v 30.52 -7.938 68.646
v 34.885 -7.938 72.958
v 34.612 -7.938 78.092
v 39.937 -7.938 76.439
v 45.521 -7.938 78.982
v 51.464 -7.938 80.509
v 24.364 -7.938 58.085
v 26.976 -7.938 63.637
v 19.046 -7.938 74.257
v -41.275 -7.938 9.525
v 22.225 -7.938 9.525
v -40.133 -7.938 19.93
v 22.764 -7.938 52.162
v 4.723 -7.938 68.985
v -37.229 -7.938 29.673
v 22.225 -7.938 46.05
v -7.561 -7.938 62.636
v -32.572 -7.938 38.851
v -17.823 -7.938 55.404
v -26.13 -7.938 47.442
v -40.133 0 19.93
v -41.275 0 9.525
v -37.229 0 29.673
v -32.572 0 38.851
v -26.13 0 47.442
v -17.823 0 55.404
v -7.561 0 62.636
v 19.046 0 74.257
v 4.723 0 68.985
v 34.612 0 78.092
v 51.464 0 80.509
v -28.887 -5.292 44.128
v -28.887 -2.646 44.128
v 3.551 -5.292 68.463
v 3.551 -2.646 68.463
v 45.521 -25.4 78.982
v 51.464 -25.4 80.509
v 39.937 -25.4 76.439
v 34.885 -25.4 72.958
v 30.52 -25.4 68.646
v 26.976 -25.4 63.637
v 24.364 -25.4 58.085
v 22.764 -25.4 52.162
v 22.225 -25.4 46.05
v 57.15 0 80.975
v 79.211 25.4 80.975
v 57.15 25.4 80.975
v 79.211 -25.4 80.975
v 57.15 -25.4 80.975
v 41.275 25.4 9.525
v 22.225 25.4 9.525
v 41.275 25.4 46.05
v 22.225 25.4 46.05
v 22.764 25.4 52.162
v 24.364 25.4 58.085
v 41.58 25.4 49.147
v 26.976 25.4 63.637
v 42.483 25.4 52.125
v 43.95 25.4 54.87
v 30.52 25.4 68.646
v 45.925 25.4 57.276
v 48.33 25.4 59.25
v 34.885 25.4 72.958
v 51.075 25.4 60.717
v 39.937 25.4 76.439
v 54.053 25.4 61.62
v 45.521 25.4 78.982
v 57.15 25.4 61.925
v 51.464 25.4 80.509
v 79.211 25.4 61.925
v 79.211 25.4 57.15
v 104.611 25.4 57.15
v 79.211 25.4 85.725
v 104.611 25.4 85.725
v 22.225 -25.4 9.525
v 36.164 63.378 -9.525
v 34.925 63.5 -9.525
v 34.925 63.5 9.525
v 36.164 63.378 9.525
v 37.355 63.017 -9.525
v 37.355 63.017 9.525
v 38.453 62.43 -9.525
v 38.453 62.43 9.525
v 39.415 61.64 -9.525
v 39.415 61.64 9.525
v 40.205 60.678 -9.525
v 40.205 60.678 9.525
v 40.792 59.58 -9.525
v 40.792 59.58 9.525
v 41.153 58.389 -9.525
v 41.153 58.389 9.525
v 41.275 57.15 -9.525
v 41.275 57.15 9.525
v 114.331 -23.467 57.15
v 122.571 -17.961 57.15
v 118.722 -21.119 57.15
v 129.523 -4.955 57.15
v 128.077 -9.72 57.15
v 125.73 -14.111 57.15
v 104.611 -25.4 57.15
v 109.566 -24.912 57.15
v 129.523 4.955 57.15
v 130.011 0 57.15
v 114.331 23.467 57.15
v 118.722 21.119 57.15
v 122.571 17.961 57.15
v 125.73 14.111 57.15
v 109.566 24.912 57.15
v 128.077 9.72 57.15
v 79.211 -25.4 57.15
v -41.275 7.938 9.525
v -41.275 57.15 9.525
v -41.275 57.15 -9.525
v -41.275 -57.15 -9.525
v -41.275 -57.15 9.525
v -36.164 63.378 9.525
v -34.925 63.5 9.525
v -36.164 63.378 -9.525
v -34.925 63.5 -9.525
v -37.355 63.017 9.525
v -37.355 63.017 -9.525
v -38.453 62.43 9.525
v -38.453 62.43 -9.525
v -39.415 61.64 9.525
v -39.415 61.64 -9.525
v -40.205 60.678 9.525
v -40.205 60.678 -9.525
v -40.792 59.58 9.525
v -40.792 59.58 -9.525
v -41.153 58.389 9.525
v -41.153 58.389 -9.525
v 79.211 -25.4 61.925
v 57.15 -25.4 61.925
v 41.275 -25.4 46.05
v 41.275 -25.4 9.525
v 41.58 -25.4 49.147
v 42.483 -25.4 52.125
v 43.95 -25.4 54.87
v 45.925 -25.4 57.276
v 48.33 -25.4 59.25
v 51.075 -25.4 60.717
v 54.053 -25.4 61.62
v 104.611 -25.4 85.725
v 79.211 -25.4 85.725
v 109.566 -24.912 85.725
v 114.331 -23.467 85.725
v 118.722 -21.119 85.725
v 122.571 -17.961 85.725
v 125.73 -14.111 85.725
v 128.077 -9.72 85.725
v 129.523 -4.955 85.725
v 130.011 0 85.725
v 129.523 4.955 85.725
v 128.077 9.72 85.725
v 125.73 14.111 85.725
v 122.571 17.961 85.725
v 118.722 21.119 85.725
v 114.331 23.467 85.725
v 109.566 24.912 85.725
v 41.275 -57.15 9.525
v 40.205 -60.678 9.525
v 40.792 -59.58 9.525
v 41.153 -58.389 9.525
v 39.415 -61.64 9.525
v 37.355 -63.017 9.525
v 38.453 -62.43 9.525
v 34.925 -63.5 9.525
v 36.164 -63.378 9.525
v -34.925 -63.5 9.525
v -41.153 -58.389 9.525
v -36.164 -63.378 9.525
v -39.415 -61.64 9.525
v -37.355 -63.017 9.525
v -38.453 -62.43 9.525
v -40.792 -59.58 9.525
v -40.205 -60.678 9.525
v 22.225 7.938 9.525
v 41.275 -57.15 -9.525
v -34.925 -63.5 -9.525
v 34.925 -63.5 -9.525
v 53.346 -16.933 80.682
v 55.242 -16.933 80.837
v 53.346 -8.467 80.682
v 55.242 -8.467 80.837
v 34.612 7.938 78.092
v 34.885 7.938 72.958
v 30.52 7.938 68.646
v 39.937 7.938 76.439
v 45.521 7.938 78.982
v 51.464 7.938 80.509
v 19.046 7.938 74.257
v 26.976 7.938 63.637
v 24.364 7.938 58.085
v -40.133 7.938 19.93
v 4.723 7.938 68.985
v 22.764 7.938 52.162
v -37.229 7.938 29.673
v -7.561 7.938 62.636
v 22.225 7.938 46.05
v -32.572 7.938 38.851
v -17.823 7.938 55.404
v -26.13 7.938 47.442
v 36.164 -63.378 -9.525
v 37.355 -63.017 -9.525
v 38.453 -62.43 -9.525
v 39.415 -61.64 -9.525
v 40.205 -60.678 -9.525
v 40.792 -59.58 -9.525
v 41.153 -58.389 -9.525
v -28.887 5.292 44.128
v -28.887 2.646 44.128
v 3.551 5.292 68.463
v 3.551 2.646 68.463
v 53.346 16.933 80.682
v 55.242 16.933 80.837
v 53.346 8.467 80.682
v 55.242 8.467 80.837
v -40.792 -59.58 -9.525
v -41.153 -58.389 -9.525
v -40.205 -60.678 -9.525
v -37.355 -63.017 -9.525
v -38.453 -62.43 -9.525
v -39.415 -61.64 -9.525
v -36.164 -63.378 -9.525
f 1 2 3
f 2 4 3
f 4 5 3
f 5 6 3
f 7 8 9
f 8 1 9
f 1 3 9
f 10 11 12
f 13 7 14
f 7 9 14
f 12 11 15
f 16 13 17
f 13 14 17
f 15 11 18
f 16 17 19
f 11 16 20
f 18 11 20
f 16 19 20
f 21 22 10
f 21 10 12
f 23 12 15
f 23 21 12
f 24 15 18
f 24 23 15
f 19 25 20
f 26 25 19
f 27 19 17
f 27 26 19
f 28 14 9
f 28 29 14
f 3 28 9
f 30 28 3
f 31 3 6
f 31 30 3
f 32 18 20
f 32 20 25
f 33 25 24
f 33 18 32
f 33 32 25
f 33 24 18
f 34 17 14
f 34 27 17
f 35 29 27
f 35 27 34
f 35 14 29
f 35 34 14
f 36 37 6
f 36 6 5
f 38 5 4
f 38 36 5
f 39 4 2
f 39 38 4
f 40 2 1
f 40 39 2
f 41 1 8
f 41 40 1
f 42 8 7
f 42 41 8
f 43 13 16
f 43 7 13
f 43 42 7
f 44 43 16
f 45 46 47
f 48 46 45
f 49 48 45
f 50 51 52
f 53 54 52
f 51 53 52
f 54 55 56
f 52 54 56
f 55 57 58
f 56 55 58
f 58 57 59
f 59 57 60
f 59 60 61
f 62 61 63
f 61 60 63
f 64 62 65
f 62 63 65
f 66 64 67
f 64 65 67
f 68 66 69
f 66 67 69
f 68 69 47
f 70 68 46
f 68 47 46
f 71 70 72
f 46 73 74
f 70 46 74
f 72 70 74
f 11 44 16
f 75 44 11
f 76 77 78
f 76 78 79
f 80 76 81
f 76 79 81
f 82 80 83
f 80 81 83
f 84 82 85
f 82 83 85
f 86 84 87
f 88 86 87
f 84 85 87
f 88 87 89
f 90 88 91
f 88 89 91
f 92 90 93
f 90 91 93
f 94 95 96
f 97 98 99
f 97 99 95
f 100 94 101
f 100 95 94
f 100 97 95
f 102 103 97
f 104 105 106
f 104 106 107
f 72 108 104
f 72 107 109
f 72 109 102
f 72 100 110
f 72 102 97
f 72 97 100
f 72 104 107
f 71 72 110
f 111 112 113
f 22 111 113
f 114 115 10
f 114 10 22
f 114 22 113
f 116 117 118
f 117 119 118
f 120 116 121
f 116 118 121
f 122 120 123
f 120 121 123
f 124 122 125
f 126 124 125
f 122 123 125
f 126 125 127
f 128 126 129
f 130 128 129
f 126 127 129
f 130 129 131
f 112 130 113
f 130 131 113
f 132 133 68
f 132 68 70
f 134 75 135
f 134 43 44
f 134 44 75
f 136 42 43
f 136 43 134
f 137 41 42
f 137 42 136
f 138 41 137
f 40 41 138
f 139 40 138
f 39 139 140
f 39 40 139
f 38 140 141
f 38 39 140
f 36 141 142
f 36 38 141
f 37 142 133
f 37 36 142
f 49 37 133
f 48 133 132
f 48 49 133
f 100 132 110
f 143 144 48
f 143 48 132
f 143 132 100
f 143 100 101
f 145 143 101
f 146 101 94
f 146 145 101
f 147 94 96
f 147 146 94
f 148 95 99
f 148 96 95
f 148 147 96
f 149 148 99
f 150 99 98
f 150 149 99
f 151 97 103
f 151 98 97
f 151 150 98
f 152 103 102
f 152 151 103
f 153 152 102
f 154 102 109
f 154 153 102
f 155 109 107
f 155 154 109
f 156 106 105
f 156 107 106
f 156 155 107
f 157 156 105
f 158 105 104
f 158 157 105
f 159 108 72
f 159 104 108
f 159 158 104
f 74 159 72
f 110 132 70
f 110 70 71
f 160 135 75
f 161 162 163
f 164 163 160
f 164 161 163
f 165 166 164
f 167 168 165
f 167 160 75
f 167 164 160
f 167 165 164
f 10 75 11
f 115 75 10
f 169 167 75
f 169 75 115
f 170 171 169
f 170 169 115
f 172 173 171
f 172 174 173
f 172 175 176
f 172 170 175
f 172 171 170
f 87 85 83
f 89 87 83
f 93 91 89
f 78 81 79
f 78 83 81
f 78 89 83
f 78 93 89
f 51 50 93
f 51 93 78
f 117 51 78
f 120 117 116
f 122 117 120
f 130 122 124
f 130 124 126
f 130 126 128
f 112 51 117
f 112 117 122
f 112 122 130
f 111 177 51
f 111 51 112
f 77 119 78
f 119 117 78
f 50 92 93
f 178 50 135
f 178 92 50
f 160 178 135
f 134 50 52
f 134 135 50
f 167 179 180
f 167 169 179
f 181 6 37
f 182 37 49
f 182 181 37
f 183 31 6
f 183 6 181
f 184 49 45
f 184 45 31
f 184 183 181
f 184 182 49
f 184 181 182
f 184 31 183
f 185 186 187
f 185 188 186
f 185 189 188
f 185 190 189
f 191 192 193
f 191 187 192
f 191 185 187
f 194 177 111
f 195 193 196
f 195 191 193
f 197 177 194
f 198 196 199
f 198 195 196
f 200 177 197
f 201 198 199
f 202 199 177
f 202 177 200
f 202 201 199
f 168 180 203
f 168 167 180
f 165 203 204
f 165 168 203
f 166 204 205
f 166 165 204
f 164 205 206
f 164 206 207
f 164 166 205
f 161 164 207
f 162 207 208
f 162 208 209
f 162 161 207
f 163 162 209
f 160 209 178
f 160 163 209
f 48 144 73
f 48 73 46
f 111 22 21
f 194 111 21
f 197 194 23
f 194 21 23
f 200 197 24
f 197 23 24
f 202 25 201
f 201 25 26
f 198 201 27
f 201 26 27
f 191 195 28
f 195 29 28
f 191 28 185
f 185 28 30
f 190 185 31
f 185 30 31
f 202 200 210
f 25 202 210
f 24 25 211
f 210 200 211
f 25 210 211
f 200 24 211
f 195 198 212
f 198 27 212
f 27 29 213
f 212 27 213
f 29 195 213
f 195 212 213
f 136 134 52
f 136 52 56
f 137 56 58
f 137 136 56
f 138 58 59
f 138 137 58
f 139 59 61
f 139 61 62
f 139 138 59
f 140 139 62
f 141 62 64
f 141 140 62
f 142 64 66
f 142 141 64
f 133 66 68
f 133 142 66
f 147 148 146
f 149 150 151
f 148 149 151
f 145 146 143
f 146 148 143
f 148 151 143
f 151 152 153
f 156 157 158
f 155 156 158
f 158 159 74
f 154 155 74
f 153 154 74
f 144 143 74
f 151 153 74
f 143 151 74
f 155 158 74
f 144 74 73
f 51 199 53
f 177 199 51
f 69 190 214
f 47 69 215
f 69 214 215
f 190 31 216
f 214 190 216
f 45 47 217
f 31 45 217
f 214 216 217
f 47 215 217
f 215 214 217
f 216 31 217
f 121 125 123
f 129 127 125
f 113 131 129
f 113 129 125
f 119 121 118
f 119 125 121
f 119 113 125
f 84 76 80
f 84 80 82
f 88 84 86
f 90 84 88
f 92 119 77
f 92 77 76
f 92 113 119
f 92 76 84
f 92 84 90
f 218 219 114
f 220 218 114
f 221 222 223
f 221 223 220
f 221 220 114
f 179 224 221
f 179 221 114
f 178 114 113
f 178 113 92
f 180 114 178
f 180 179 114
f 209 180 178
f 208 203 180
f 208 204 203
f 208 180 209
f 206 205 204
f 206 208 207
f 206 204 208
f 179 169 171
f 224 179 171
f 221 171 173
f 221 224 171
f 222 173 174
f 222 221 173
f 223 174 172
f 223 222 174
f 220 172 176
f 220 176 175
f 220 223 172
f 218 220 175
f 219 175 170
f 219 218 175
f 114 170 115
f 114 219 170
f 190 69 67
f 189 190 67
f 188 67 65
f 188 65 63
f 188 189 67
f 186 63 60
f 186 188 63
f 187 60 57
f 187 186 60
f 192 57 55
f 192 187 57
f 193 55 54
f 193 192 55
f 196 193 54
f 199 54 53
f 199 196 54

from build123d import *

# Parameters (mm, degrees)
F1_DEPTH = 63.5
F2_DEPTH = 25.4
F3_DEPTH = 7.9375
F0_W     = 25.4
F0_H     = 28.575
F5_R     = 6.35


with BuildPart() as f1:
    # F0 (on Front) → F1 (new body, symmetric)
    with BuildSketch(Plane.XZ):
        Polygon((-41.275, 9.525), (-41.275, -9.525), (41.275, -9.525), (41.275, 9.525), (22.224999, 9.525), align=None)
    extrude(amount=F1_DEPTH, both=True)

    # F0 (on Front) → F2 (join, symmetric)
    with BuildSketch(Plane.XZ):
        with BuildLine():
            Line((22.224999, 9.525), (41.275, 9.525))
            Line((41.275, 9.525), (41.275, 46.0502))
            ThreePointArc((41.275, 46.0502), (45.92468, 57.27552), (57.15, 61.9252))
            Line((57.15, 61.9252), (79.210615, 61.9252))
            Line((79.210615, 61.9252), (79.210615, 80.975201))
            Line((79.210615, 80.975201), (57.15, 80.975201))
            add(Edge.make_bspline(
                [(51.463786, 80.5092), (53.33983, 80.690444), (55.23552, 80.845904), (57.15, 80.975201)],
                knots=[117.550544, 117.550544, 117.550544, 117.550544, 121.624882, 121.624882, 121.624882, 121.624882], degree=3))
            ThreePointArc((51.463786, 80.5092), (30.519691, 68.646269), (22.224999, 46.0502))
            Line((22.224999, 46.0502), (22.224999, 9.525))
        make_face()
        Polygon((79.210615, 85.725), (79.210615, 80.975201), (79.210615, 61.9252), (79.210615, 57.15), (104.610615, 57.15), (104.610615, 85.725), align=None)
    extrude(amount=F2_DEPTH, both=True)

    # F0 (on Front) → F3 (join, symmetric)
    with BuildSketch(Plane.XZ):
        with BuildLine():
            add(Edge.make_bspline(
                [(-41.275, 9.525), (-40.4355, 48.588255), (-2.662796, 75.280054), (51.463786, 80.5092)],
                knots=[0, 0, 0, 0, 117.550544, 117.550544, 117.550544, 117.550544], degree=3))
            Line((-41.275, 9.525), (22.224999, 9.525))
            Line((22.224999, 9.525), (22.224999, 46.0502))
            ThreePointArc((22.224999, 46.0502), (30.519691, 68.646269), (51.463786, 80.5092))
        make_face()
    extrude(amount=F3_DEPTH, both=True)

    # F0 (on Front) → F4 (revolve)
    with BuildSketch(Plane.XZ):
        with Locations((117.310615, 71.4375)):
            Rectangle(F0_W, F0_H)
    revolve(axis=Axis((104.610615, 0, 71.4375), (0, 0, 1)))

    # F5
    f5_edges = [f1.edges().sort_by_distance(p)[0] for p in [
        (41.275, -63.5, 0),
        (41.275, 63.5, 0),
        (-41.275, 63.5, 0),
        (-41.275, -63.5, 0),
    ]]
    fillet(f5_edges, radius=F5_R)


solid = f1.part
